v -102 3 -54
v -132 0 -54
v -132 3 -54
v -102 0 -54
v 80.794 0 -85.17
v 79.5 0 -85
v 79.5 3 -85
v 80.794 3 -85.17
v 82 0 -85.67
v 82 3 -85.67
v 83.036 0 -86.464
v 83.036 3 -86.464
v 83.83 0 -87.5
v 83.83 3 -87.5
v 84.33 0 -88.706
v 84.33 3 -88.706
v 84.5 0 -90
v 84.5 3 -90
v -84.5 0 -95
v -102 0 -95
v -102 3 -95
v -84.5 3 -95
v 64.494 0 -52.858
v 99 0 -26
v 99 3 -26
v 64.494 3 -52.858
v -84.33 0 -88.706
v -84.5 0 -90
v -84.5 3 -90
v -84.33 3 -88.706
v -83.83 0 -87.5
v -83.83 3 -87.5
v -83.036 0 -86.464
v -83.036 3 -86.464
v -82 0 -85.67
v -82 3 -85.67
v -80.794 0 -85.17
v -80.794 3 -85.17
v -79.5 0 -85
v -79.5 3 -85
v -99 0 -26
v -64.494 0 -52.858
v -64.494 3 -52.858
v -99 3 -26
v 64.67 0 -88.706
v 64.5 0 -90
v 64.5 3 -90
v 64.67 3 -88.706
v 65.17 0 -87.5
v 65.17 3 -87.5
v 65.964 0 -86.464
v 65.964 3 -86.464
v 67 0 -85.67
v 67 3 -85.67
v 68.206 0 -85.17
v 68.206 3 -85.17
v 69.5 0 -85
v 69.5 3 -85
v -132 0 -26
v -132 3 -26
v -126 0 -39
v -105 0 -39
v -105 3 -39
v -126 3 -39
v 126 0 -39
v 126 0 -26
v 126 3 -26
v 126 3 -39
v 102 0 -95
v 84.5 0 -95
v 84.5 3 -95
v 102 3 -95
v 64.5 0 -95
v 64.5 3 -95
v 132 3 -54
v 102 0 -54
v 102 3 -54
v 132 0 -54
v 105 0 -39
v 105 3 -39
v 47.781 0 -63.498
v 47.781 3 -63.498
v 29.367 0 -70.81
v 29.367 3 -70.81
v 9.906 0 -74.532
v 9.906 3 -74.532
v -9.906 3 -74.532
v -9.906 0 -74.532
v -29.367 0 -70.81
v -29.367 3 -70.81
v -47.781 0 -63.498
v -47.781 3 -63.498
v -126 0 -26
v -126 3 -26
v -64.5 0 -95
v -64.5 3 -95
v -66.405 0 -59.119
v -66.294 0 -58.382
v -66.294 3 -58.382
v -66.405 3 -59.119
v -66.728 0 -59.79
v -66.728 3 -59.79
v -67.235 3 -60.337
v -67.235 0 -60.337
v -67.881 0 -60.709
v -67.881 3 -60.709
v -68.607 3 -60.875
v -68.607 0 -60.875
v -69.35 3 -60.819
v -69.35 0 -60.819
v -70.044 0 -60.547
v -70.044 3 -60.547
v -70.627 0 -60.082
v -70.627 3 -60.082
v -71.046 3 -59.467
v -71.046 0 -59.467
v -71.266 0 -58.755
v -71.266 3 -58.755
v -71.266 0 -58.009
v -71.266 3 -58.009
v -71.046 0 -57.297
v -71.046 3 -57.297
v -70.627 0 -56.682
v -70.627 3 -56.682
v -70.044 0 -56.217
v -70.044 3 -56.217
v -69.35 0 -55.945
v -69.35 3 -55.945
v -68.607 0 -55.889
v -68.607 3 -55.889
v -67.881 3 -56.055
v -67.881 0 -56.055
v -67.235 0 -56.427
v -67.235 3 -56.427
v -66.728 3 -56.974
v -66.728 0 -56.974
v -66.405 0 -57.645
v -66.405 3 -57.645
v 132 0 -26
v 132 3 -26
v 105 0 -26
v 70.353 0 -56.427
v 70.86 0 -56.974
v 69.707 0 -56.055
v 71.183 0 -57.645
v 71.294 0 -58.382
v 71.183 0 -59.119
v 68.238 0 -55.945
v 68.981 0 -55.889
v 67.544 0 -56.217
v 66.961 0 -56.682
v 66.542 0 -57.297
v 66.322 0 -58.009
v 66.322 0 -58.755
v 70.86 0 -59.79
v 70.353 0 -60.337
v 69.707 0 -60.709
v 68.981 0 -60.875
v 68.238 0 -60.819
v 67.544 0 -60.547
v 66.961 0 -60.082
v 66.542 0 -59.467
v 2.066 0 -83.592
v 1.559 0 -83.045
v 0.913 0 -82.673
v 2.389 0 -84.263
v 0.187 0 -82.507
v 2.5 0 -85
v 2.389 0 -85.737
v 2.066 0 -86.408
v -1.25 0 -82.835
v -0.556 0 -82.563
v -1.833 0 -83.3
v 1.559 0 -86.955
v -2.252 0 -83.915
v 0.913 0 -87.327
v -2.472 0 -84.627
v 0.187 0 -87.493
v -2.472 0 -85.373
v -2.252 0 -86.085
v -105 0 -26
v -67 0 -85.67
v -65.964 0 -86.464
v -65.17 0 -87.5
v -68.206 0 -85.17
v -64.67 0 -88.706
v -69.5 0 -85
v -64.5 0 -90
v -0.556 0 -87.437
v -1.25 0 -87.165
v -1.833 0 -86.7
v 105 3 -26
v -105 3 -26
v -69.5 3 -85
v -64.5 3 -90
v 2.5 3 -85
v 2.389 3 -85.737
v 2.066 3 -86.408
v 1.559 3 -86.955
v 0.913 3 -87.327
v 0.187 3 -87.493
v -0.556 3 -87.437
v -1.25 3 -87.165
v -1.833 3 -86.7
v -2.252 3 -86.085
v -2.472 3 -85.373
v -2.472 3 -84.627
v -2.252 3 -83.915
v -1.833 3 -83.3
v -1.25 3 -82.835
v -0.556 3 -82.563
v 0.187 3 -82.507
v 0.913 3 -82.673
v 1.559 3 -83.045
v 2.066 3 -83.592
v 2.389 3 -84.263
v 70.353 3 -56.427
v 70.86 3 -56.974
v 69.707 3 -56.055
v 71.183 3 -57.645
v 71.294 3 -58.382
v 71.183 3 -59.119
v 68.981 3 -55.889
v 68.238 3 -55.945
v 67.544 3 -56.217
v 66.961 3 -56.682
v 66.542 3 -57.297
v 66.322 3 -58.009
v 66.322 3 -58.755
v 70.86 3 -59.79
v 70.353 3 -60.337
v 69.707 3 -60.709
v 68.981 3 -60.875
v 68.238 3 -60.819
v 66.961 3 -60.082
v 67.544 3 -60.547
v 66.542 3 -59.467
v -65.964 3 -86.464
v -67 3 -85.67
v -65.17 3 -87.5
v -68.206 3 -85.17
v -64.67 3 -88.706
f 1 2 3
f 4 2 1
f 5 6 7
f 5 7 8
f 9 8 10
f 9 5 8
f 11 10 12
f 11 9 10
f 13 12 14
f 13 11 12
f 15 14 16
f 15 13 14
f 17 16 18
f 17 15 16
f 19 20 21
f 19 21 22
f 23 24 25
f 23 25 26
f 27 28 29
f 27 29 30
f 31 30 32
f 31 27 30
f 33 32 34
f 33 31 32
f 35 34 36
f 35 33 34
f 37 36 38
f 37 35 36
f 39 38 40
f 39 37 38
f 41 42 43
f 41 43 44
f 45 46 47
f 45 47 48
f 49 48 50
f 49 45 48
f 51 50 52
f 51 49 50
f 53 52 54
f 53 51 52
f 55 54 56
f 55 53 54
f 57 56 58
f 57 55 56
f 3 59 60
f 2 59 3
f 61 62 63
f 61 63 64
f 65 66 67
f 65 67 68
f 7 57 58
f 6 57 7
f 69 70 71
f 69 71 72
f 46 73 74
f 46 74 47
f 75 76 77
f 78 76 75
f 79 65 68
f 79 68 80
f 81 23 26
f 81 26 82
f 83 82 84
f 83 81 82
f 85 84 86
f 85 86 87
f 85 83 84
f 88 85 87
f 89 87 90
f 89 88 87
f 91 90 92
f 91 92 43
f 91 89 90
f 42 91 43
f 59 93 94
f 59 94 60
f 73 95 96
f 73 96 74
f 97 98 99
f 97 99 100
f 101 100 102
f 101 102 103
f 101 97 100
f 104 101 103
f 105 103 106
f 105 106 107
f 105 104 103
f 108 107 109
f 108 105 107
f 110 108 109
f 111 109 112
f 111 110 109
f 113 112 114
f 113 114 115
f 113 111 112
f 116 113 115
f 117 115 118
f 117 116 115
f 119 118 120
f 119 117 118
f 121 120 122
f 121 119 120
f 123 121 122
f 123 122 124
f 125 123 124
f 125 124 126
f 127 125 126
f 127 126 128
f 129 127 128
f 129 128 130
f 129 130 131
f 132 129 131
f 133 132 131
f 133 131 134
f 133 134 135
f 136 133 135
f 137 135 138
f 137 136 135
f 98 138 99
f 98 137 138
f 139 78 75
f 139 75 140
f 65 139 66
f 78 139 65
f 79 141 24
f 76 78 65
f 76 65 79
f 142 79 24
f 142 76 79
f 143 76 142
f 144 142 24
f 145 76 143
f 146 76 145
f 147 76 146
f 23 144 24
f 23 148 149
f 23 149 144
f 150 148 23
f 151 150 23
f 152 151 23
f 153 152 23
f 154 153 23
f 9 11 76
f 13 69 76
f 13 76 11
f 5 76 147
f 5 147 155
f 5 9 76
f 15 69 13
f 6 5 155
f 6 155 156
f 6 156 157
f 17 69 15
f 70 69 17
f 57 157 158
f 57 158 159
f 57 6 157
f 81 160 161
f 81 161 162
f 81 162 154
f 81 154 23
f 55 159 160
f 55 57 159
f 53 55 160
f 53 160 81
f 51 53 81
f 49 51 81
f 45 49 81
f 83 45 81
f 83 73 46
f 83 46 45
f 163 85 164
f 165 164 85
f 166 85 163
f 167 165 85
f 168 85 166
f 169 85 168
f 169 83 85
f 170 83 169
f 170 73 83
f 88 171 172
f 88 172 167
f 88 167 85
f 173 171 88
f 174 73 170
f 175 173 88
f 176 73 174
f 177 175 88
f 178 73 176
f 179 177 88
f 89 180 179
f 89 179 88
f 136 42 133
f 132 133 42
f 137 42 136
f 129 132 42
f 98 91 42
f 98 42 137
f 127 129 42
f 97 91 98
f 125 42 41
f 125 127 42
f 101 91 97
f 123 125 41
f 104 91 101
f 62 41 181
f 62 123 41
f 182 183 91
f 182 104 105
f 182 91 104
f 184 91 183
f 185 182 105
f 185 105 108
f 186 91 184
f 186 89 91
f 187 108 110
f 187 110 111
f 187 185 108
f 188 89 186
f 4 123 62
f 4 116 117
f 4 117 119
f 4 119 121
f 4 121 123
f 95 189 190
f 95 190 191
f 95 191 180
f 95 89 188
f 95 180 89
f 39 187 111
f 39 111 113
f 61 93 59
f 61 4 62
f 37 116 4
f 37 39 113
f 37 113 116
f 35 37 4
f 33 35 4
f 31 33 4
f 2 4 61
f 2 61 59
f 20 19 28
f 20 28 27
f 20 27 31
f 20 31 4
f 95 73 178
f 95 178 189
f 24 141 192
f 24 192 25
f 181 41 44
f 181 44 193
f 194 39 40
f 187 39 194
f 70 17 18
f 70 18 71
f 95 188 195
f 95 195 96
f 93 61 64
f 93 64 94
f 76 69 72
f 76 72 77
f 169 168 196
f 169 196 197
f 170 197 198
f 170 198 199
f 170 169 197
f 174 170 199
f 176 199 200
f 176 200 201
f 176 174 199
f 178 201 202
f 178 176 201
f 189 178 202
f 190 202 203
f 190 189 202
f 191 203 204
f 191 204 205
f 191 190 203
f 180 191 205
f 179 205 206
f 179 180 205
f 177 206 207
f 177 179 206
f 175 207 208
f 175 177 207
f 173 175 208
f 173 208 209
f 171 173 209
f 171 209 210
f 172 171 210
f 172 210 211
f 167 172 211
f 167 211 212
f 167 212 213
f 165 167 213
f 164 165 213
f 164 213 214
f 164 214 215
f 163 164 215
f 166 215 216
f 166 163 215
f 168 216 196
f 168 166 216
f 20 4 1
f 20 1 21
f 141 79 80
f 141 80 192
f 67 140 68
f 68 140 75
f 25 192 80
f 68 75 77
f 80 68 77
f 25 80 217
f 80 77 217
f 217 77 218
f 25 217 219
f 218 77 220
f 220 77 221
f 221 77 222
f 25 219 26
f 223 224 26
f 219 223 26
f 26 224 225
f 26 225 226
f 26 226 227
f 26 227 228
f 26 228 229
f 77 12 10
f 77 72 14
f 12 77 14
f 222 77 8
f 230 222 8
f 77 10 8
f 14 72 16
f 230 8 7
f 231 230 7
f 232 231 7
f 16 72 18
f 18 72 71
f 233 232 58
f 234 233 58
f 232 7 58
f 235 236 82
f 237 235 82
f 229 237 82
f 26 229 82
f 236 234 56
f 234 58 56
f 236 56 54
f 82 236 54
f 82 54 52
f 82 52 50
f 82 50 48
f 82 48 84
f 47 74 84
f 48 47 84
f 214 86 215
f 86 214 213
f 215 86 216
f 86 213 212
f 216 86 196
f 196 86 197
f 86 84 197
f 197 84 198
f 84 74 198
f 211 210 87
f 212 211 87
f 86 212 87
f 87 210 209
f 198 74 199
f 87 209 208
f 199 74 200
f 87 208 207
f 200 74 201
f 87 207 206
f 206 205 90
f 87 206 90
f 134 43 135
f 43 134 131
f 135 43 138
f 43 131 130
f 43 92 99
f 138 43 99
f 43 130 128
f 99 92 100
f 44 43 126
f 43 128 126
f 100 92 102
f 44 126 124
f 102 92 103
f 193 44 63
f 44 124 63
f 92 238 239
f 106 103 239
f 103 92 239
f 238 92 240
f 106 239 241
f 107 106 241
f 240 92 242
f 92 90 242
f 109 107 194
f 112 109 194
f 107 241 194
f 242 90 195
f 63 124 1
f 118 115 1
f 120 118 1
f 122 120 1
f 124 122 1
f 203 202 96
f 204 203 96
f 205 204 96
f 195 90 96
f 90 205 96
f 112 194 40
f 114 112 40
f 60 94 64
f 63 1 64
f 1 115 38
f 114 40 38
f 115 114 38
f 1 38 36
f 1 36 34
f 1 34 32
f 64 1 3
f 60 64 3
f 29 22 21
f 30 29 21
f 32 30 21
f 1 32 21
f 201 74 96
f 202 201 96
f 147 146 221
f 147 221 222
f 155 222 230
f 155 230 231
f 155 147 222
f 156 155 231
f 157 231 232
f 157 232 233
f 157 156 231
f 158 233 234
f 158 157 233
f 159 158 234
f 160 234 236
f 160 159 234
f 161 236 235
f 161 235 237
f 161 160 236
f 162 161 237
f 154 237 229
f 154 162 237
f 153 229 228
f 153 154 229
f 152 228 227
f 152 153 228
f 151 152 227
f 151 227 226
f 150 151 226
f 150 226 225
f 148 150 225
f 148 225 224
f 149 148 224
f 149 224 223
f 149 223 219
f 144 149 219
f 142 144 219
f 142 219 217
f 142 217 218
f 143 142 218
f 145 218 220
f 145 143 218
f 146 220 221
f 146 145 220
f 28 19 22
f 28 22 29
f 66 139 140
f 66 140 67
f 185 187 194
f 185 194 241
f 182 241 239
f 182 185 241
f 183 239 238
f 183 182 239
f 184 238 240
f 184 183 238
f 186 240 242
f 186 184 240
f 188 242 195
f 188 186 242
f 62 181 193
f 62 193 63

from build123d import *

# Parameters (mm, degrees)
ESQUISSE1_R      = 2.5
EXTRUSION1_DEPTH = 3


with BuildPart() as part:
    # Esquisse1 → Extrusion1 (new body)
    with BuildSketch(Plane(origin=(0, 0, 0), x_dir=(1, 0, 0), z_dir=(0, 1, 0))):
        with BuildLine():
            Line((-64.494367887, 52.858171056), (-99, 26))
            Line((-99, 26), (-105, 26))
            Line((-105, 26), (-105, 39))
            Line((-105, 39), (-126, 39))
            Line((-126, 39), (-126, 26))
            Line((-126, 26), (-132, 26))
            Line((-132, 26), (-132, 54))
            Line((-132, 54), (-102, 54))
            Line((-102, 54), (-102, 95))
            Line((-102, 95), (-84.5, 95))
            Line((-84.5, 95), (-84.5, 90))
            ThreePointArc((-84.5, 90), (-83.035533906, 86.464466094), (-79.5, 85))
            Line((-79.5, 85), (-69.5, 85))
            ThreePointArc((-69.5, 85), (-65.964466094, 86.464466094), (-64.5, 90))
            Line((-64.5, 90), (-64.5, 95))
            Line((-64.5, 95), (64.5, 95))
            Line((64.5, 95), (64.5, 90))
            ThreePointArc((64.5, 90), (65.964466094, 86.464466094), (69.5, 85))
            Line((69.5, 85), (79.5, 85))
            ThreePointArc((79.5, 85), (83.035533906, 86.464466094), (84.5, 90))
            Line((84.5, 90), (84.5, 95))
            Line((84.5, 95), (102, 95))
            Line((102, 95), (102, 54))
            Line((102, 54), (132, 54))
            Line((132, 54), (132, 26))
            Line((132, 26), (126, 26))
            Line((126, 26), (126, 39))
            Line((126, 39), (105, 39))
            Line((105, 39), (105, 26))
            Line((105, 26), (99, 26))
            Line((99, 26), (64.494367887, 52.858171056))
            ThreePointArc((64.494367887, 52.858171056), (0, 75), (-64.494367887, 52.858171056))
        make_face()
        with Locations((-68.793992413, 58.382049127)):
            Circle(ESQUISSE1_R, mode=Mode.SUBTRACT)
        with Locations((68.793992413, 58.382049127)):
            Circle(ESQUISSE1_R, mode=Mode.SUBTRACT)
        with Locations((0, 85)):
            Circle(ESQUISSE1_R, mode=Mode.SUBTRACT)
    extrude(amount=EXTRUSION1_DEPTH)


solid = part.part
